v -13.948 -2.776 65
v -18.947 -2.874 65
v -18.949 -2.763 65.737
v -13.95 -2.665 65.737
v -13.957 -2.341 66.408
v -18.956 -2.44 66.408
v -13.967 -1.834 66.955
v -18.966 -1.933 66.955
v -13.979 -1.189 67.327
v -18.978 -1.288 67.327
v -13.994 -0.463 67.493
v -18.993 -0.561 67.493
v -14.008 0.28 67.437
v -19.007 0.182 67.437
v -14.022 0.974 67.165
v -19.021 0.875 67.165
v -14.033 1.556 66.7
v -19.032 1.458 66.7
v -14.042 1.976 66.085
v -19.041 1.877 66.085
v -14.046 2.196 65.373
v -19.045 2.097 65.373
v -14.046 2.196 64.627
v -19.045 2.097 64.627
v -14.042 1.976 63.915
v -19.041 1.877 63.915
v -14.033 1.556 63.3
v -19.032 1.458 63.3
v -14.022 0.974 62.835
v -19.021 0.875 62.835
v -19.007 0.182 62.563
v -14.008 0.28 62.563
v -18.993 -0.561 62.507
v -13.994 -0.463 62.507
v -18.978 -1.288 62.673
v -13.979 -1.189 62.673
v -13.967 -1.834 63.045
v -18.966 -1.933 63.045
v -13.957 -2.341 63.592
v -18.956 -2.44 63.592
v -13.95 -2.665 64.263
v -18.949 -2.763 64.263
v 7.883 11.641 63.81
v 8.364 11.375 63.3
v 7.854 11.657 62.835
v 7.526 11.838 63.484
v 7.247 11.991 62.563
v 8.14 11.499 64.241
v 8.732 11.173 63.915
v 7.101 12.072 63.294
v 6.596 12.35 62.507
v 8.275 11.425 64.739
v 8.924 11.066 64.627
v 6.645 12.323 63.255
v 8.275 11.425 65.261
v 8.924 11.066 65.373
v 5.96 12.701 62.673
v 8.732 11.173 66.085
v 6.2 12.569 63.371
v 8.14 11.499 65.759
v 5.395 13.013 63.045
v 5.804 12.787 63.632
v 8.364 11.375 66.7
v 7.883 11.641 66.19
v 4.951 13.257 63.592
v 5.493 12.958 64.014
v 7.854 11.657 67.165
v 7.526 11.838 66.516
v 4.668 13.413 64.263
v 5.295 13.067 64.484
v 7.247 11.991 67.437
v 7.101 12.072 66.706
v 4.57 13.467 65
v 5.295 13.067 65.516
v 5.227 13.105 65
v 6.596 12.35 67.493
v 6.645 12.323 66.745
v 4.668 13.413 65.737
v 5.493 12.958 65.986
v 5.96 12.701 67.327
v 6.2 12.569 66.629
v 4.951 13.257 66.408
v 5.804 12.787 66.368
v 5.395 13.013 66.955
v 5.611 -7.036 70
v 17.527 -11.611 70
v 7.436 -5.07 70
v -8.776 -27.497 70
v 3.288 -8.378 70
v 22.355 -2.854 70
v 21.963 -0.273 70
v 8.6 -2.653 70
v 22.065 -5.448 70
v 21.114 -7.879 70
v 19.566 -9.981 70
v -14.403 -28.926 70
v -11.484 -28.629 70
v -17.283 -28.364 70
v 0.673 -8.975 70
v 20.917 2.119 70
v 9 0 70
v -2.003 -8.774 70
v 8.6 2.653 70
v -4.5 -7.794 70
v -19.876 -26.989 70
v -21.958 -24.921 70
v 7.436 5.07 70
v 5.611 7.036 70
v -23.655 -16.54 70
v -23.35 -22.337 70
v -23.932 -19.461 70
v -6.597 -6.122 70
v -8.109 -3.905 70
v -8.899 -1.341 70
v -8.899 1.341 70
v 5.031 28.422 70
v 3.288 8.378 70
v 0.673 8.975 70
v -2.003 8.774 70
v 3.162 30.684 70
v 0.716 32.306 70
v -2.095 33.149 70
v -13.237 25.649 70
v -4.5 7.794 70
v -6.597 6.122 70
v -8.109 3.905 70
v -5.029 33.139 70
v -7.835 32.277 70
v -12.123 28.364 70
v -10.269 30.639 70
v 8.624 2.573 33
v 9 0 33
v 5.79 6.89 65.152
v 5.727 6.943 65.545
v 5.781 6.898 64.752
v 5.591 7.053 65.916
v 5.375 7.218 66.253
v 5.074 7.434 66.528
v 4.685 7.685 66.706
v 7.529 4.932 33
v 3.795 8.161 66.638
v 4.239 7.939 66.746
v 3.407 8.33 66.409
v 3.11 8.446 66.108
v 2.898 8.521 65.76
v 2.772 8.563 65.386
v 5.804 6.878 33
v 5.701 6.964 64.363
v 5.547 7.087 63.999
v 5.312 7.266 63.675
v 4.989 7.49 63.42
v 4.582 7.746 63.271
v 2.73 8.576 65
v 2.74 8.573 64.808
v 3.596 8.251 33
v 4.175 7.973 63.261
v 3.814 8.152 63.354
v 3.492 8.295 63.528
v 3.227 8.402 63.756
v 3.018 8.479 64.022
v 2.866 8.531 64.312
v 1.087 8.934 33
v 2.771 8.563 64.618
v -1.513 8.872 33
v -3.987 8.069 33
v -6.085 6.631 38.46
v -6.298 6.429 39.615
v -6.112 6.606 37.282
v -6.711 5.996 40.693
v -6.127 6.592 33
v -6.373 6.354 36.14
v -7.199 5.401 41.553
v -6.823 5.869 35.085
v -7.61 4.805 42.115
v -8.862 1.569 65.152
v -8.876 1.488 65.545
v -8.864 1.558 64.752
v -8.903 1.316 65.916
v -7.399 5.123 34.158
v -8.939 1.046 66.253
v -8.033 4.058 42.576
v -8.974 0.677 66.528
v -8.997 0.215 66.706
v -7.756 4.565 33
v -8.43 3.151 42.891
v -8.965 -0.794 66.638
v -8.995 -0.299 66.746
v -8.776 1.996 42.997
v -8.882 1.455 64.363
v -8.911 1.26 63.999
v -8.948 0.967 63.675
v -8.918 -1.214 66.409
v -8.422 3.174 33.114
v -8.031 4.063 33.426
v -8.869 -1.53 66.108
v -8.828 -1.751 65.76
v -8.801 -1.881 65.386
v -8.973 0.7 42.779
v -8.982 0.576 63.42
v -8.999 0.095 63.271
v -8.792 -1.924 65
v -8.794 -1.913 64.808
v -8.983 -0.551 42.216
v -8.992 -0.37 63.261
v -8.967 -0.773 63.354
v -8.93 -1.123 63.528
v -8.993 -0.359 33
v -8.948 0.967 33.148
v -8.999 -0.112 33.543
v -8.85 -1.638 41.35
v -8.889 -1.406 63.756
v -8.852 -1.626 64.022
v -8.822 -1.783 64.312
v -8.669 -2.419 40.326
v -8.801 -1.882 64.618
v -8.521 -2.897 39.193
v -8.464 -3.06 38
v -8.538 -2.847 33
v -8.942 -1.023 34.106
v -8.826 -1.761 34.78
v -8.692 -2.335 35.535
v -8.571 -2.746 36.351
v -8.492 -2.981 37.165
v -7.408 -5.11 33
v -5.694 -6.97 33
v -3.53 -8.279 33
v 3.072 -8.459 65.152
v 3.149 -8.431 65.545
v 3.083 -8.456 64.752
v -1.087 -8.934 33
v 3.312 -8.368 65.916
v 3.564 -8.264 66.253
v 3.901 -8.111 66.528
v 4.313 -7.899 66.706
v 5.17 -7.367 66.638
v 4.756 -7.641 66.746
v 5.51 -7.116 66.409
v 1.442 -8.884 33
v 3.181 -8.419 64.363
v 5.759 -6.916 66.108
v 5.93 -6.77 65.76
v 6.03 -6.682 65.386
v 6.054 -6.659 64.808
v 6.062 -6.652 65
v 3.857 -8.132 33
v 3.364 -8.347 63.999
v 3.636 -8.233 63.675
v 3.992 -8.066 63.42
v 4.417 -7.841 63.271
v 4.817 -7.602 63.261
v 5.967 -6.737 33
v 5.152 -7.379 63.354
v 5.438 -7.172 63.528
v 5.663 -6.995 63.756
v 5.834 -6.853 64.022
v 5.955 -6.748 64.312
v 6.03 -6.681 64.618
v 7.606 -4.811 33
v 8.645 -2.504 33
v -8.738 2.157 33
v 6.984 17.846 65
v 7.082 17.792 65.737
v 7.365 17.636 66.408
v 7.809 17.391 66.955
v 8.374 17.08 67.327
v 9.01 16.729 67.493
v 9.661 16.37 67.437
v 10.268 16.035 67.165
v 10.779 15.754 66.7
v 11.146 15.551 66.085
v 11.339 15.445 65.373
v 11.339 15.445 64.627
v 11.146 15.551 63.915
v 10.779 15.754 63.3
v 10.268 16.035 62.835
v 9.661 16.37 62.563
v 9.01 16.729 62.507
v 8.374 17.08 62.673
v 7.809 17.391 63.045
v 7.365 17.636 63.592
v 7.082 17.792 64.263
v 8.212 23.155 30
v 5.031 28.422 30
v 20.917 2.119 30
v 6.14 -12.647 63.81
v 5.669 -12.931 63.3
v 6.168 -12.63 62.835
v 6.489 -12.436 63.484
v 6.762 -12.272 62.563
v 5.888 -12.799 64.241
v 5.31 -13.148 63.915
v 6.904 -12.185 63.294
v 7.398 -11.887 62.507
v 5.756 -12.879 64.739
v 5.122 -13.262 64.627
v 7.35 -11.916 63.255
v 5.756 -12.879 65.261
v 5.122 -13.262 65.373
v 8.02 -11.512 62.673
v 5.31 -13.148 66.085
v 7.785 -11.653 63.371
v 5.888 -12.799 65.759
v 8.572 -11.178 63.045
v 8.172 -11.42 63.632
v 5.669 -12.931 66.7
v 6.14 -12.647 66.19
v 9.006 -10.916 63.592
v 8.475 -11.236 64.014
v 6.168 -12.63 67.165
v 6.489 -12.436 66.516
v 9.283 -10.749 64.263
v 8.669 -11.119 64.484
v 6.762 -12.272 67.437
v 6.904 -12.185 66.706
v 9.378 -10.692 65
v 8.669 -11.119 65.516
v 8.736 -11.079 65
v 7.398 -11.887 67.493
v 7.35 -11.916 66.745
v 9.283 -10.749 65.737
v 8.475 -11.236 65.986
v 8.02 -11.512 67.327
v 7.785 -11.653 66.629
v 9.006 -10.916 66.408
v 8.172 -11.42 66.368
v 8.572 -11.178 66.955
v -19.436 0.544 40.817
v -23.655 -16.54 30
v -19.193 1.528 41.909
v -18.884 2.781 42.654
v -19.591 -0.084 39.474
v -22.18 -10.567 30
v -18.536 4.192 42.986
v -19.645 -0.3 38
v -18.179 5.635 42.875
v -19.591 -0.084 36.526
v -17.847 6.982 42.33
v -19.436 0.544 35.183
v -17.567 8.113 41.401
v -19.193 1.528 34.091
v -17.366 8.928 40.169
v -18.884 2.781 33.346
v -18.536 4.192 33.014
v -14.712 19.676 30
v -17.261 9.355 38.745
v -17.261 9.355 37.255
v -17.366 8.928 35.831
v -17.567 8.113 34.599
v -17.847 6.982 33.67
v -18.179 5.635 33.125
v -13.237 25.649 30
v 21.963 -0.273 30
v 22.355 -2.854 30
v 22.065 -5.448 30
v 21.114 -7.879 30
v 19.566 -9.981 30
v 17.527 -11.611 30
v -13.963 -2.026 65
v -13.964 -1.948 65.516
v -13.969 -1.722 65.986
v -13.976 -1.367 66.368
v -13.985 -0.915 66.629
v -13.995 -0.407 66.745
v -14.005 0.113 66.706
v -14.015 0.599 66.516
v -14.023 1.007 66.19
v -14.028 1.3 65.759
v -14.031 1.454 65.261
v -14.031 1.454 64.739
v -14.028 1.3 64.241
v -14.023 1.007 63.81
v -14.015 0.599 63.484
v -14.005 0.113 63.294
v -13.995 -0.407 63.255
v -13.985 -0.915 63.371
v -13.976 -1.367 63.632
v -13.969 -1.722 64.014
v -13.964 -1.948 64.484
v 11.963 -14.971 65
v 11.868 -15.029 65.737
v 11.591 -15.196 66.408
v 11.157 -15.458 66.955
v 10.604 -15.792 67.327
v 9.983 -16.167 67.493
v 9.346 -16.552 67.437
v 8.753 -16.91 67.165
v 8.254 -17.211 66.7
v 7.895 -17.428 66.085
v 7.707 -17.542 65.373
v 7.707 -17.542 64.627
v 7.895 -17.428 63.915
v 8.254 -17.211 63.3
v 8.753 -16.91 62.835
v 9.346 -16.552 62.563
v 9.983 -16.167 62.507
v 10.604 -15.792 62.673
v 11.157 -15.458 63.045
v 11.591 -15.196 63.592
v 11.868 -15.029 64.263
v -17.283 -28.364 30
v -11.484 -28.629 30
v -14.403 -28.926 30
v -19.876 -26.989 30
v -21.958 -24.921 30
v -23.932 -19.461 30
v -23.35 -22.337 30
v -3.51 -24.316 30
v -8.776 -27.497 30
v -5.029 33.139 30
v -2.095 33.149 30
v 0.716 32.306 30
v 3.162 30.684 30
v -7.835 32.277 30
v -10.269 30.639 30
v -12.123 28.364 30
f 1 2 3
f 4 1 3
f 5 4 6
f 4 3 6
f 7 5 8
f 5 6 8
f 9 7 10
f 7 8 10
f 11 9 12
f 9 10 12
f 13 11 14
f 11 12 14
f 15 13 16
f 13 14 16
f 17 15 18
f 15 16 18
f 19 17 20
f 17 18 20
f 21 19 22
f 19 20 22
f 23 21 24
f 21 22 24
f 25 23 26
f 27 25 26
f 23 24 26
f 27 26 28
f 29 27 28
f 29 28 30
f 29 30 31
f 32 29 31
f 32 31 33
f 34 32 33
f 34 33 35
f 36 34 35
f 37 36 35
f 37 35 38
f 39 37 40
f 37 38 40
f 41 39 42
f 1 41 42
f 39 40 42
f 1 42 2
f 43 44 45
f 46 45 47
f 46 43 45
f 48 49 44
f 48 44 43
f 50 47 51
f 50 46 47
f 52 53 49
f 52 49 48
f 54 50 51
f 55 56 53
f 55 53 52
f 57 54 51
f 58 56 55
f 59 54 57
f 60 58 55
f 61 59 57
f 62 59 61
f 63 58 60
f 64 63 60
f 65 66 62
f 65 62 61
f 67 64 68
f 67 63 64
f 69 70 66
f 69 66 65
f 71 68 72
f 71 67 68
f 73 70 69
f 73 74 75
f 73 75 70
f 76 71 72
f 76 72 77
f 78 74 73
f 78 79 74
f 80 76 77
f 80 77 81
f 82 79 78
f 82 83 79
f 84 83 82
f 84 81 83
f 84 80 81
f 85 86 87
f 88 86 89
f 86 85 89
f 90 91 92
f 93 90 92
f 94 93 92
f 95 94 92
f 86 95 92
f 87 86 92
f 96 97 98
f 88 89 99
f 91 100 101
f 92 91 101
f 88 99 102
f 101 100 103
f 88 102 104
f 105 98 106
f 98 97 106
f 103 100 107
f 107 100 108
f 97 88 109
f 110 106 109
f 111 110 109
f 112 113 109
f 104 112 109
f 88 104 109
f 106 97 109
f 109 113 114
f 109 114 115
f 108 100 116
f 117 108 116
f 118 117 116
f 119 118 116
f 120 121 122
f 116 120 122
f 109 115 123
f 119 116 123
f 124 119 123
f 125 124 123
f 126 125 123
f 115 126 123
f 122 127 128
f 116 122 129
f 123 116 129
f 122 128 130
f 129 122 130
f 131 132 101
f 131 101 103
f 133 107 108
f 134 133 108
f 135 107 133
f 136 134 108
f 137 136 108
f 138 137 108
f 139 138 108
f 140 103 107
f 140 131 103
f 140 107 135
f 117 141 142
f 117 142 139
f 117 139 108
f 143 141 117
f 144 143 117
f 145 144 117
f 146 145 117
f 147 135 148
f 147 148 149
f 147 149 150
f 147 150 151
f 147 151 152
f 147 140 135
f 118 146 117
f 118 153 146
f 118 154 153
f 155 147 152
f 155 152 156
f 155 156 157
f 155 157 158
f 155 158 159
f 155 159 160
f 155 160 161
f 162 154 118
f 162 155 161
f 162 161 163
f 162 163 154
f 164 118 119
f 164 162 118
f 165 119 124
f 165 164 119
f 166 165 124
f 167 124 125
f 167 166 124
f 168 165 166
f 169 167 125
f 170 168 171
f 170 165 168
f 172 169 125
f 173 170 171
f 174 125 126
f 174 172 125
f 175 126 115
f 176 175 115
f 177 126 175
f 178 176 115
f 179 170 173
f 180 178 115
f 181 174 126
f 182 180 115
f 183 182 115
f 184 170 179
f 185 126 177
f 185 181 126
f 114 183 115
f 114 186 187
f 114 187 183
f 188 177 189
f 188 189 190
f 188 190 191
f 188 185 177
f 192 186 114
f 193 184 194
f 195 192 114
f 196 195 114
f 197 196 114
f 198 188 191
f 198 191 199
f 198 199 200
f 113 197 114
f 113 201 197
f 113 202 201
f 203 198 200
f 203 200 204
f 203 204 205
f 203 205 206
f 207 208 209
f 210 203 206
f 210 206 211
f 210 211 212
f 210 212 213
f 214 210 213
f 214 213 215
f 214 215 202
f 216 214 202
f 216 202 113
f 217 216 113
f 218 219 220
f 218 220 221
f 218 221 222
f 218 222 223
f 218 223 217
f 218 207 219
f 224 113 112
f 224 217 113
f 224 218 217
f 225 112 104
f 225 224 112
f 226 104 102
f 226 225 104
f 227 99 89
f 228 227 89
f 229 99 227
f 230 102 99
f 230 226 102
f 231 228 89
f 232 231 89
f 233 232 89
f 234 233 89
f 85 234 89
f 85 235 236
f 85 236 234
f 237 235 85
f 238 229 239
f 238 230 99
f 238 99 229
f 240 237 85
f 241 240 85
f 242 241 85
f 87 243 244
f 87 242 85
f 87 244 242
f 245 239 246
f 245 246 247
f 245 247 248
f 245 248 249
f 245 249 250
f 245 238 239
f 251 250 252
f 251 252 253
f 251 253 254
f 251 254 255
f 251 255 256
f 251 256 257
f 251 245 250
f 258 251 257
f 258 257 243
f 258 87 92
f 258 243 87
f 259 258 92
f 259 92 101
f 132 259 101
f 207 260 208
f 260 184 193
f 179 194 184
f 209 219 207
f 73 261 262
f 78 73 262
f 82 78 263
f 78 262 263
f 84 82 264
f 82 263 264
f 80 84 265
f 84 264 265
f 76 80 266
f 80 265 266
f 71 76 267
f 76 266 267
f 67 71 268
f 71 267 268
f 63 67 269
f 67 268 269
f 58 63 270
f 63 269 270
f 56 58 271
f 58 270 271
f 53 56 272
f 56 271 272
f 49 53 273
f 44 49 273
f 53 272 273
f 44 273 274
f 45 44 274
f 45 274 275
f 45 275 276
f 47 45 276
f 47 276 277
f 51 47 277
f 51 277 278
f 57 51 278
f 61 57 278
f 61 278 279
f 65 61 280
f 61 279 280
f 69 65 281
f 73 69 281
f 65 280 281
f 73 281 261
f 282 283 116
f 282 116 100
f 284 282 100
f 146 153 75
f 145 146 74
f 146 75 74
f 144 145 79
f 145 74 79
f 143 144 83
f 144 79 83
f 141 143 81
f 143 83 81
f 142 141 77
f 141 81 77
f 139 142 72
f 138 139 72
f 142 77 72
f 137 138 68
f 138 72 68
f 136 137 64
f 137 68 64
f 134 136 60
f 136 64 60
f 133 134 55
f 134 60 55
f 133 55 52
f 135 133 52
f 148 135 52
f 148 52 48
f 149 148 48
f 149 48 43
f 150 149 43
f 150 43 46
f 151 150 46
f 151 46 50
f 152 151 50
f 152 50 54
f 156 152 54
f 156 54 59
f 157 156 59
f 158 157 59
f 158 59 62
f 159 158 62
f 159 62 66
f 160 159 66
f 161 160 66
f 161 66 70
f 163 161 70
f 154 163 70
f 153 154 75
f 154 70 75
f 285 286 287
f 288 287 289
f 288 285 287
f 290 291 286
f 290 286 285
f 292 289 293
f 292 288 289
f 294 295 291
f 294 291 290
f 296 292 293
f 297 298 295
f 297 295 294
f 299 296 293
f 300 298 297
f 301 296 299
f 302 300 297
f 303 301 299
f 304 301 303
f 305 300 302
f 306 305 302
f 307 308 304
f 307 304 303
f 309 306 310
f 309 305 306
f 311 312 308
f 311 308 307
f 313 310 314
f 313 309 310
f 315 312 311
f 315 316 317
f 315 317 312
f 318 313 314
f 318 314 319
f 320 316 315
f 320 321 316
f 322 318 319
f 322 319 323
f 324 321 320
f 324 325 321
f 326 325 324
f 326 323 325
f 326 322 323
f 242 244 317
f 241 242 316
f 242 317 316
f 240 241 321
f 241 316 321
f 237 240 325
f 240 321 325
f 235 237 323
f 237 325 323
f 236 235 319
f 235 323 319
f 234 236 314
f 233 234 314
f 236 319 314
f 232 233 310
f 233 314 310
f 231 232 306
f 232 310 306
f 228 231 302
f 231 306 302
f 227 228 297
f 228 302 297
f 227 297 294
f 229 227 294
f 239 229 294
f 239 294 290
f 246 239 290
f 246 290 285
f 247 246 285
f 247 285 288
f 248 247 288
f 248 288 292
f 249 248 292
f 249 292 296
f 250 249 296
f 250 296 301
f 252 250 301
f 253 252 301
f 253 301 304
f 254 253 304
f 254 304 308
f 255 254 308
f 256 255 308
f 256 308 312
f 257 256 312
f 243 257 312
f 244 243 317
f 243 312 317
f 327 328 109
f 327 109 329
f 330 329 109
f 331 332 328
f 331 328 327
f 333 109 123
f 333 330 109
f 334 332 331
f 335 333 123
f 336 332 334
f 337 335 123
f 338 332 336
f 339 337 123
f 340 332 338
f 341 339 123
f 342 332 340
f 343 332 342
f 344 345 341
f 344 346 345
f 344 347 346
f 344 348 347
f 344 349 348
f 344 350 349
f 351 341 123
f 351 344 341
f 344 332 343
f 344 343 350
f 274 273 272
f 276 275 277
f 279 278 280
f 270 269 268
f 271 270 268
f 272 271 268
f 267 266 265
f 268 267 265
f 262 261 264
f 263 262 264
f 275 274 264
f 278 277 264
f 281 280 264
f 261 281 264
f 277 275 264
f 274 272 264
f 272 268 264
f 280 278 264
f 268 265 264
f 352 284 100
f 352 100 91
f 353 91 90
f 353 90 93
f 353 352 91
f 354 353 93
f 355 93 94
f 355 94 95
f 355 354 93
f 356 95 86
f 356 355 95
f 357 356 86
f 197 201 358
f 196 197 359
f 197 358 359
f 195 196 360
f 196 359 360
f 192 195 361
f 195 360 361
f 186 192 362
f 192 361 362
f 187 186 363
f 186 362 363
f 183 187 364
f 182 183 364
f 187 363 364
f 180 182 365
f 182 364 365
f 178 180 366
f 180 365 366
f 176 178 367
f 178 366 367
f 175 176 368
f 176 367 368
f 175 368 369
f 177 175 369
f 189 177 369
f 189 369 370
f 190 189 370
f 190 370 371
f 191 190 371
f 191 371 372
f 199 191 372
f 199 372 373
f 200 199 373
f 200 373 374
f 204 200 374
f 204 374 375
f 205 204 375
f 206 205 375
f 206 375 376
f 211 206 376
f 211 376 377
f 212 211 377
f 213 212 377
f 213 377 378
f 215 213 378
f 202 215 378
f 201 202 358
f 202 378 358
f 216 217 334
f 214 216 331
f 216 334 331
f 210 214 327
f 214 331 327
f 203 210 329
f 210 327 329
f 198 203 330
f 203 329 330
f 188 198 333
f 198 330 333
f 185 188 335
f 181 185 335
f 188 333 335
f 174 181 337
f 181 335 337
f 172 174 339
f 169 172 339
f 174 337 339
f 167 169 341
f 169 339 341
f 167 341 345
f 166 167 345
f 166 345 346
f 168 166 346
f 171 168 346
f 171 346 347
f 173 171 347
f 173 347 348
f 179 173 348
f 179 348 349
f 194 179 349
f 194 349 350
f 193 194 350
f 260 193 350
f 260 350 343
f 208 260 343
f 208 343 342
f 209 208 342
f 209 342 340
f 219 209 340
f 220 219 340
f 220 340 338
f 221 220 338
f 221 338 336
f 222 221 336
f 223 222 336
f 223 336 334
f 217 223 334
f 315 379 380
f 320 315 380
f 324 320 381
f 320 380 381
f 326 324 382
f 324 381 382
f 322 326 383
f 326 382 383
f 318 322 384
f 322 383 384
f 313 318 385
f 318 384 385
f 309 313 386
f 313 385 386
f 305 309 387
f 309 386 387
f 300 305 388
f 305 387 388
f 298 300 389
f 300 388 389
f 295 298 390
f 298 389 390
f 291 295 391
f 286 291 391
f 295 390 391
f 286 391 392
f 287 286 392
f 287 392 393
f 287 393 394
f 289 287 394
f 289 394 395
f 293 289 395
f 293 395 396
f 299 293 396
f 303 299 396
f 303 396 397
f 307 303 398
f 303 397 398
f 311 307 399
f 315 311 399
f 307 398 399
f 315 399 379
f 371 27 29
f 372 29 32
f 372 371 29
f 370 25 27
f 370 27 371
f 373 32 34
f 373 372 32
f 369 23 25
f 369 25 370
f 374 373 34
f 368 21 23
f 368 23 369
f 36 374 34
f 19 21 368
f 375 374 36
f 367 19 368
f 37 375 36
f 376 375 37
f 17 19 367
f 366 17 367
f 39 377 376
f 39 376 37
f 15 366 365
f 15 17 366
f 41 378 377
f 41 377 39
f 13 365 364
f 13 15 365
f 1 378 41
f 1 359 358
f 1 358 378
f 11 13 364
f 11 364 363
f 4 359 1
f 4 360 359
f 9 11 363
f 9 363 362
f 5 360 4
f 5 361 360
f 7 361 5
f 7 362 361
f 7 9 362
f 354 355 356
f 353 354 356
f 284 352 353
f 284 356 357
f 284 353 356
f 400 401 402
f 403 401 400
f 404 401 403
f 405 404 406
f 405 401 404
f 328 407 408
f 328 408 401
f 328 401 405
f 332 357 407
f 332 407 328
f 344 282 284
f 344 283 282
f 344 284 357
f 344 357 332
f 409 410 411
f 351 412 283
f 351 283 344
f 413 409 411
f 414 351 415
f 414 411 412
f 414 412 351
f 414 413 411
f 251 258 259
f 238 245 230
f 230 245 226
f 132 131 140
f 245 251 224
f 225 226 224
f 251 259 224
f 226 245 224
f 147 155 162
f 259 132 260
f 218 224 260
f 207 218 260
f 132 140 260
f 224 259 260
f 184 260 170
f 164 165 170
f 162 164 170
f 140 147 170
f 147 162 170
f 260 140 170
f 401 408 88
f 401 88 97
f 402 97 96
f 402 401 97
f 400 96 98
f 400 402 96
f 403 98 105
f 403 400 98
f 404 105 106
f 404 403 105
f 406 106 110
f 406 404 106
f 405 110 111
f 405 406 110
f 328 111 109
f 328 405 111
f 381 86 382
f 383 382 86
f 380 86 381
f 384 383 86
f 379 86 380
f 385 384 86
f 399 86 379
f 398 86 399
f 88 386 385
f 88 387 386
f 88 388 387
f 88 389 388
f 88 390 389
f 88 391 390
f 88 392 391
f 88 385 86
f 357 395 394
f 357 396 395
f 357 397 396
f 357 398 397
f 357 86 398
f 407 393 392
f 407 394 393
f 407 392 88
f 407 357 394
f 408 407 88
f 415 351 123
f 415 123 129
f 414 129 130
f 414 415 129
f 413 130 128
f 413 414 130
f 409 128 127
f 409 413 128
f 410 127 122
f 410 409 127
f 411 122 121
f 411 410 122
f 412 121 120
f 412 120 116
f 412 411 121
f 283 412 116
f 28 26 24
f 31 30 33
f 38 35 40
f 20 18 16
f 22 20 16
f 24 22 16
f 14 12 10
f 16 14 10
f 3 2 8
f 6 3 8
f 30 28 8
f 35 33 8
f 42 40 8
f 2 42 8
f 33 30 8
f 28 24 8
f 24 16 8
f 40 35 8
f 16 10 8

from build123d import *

# Parameters (mm, degrees)
SKETCH1_R               = 9
BOSS_EXTRUDE1_DEPTH     = 70
SKETCH2_R               = 2.5
CUT_EXTRUDE1_DEPTH      = 5
CUT_EXTRUDE2_REACH      = 90.987
CUT_EXTRUDE2_END_RADIUS = 9
SKETCH3_R               = 1.75
CIRPATTERN1_COUNT       = 3
SKETCH5_W               = 24.568161226
SKETCH5_H               = 25
SKETCH6_R               = 9
BOSS_EXTRUDE2_DEPTH     = 5
SKETCH8_R               = 9
BOSS_EXTRUDE3_DEPTH     = 3
CUT_EXTRUDE3_REACH      = 83.112
SKETCH9_R               = 1.875
SKETCH11_R              = 4
CUT_EXTRUDE4_DEPTH      = 3
CUT_EXTRUDE5_DEPTH      = 82.111701173
CUT_EXTRUDE5_DEPTH_BACK = 82.111701173
SKETCH12_W              = 65.170629785
SKETCH12_H              = 33.219663289
CUT_EXTRUDE6_REACH      = 89.673
CUT_EXTRUDE6_END_RADIUS = 9
SKETCH13_R              = 5


with BuildPart() as part:
    # Sketch1 → Boss-Extrude1 (new body)
    with BuildSketch(Plane.XY):
        with BuildLine():
            Line((-23.6546385, -16.539669722), (-13.23734813, 25.649078182))
            ThreePointArc((-13.23734813, 25.649078182), (-5.029445343, 33.138647287), (5.031042671, 28.421667909))
            Line((5.031042671, 28.421667909), (20.916771438, 2.118648772))
            ThreePointArc((20.916771438, 2.118648772), (22.065215706, -5.448366461), (17.526600651, -11.611126974))
            Line((17.526600651, -11.611126974), (-8.776418486, -27.496855741))
            ThreePointArc((-8.776418486, -27.496855741), (-19.876207308, -26.988917124), (-23.6546385, -16.539669722))
        make_face()
        Circle(SKETCH1_R, mode=Mode.SUBTRACT)
    extrude(amount=BOSS_EXTRUDE1_DEPTH)

    # Sketch2 → Cut-Extrude1 (cut)
    with BuildSketch(Plane(origin=(9.822624711, -16.263949206, 0), x_dir=(0.8559973266359324, 0.5169802479709809, 0), z_dir=(0.5169802479709809, -0.8559973266359324, 0))):
        with Locations((0, 65)):
            Circle(SKETCH2_R)
    cut_extrude1 = extrude(amount=-CUT_EXTRUDE1_DEPTH, mode=Mode.SUBTRACT)

    # Cut-Extrude2: up to this cylinder (the profile starts outside it)
    cut_extrude2_end = Plane(origin=(0, 0, 65), z_dir=(0, 0, -1)) * Cylinder(CUT_EXTRUDE2_END_RADIUS, 200.974, mode=Mode.PRIVATE)
    # Sketch3 → Cut-Extrude2 (cut, up to the surface)
    with BuildSketch(Plane(origin=(7.237723472, -11.983962573, 0), x_dir=(0.8559973266359324, 0.5169802479709809, 0), z_dir=(0.5169802479709809, -0.8559973266359324, 0)), mode=Mode.PRIVATE) as cut_extrude2_sk1:
        with Locations((0, 65)):
            Circle(SKETCH3_R)
    cut_extrude2_tool1 = extrude(cut_extrude2_sk1.sketch, amount=-CUT_EXTRUDE2_REACH, mode=Mode.PRIVATE) - cut_extrude2_end
    cut_extrude2 = cut_extrude2_tool1.solids().sort_by_distance((7.237723, -11.983963, 65))[0]
    add(cut_extrude2, mode=Mode.SUBTRACT)

    # CirPattern1: Cut-Extrude1, Cut-Extrude2 ×3 about axis
    cirpattern1_axis = Axis((0, 0, 0), (0, 0, 1))
    add([cut_extrude1.rotate(cirpattern1_axis, i * 360 / CIRPATTERN1_COUNT) for i in range(1, CIRPATTERN1_COUNT)], mode=Mode.SUBTRACT)
    add([cut_extrude2.rotate(cirpattern1_axis, i * 360 / CIRPATTERN1_COUNT) for i in range(1, CIRPATTERN1_COUNT)], mode=Mode.SUBTRACT)

    # Sketch5 → Cut-Revolve1 (revolve, cut)
    with BuildSketch(Plane(origin=(0, 0, 0), x_dir=(1, 0, 0), z_dir=(0, 1, 0)), mode=Mode.PRIVATE) as cut_revolve1_sk:
        with Locations((-12.284080613, -17.5)):
            Rectangle(SKETCH5_W, SKETCH5_H)
    revolve(cut_revolve1_sk.sketch.rotate(Axis((0, 0, 0), (0, 0, 1)), 180), axis=Axis((0, 0, 0), (0, 0, 1)), mode=Mode.SUBTRACT)

    # Sketch6 → Boss-Extrude2 (add)
    with BuildSketch(Plane(origin=(0, 0, 0), x_dir=(-1, 0, 0), z_dir=(0, 0, -1))):
        with Locations(Location((0, 0, 0), (0, 0, 180))):
            Circle(SKETCH6_R)
    extrude(amount=-BOSS_EXTRUDE2_DEPTH)

    # Sketch8 → Boss-Extrude3 (add)
    with BuildSketch(Plane(origin=(0, 0, 30), x_dir=(-1, 0, 0), z_dir=(0, 0, -1))):
        Circle(SKETCH8_R)
    extrude(amount=-BOSS_EXTRUDE3_DEPTH)

    # Sketch9 → Cut-Extrude3 (cut, up to next)
    with BuildSketch(Plane(origin=(0, 0, 0), x_dir=(-1, 0, 0), z_dir=(0, 0, -1)), mode=Mode.PRIVATE) as cut_extrude3_sk1:
        with Locations((0, 8)):
            Circle(SKETCH9_R)
    cut_extrude3_tool1 = extrude(cut_extrude3_sk1.sketch, amount=-CUT_EXTRUDE3_REACH, mode=Mode.PRIVATE) & part.part
    # Sketch9 → Cut-Extrude3 (cut, up to next)
    with BuildSketch(Plane(origin=(0, 0, 0), x_dir=(-1, 0, 0), z_dir=(0, 0, -1)), mode=Mode.PRIVATE) as cut_extrude3_sk2:
        with Locations((8, 0)):
            Circle(SKETCH9_R)
    cut_extrude3_tool2 = extrude(cut_extrude3_sk2.sketch, amount=-CUT_EXTRUDE3_REACH, mode=Mode.PRIVATE) & part.part
    # Sketch9 → Cut-Extrude3 (cut, up to next)
    with BuildSketch(Plane(origin=(0, 0, 0), x_dir=(-1, 0, 0), z_dir=(0, 0, -1)), mode=Mode.PRIVATE) as cut_extrude3_sk3:
        with Locations((0, -8)):
            Circle(SKETCH9_R)
    cut_extrude3_tool3 = extrude(cut_extrude3_sk3.sketch, amount=-CUT_EXTRUDE3_REACH, mode=Mode.PRIVATE) & part.part
    # Sketch9 → Cut-Extrude3 (cut, up to next)
    with BuildSketch(Plane(origin=(0, 0, 0), x_dir=(-1, 0, 0), z_dir=(0, 0, -1)), mode=Mode.PRIVATE) as cut_extrude3_sk4:
        with Locations((-8, 0)):
            Circle(SKETCH9_R)
    cut_extrude3_tool4 = extrude(cut_extrude3_sk4.sketch, amount=-CUT_EXTRUDE3_REACH, mode=Mode.PRIVATE) & part.part
    add(cut_extrude3_tool1.solids().sort_by_distance((0, 8, 0))[0], mode=Mode.SUBTRACT)
    add(cut_extrude3_tool2.solids().sort_by_distance((-8, 0, 0))[0], mode=Mode.SUBTRACT)
    add(cut_extrude3_tool3.solids().sort_by_distance((0, -8, 0))[0], mode=Mode.SUBTRACT)
    add(cut_extrude3_tool4.solids().sort_by_distance((8, 0, 0))[0], mode=Mode.SUBTRACT)

    # Sketch11 → Cut-Extrude4 (cut)
    with BuildSketch(Plane(origin=(0, 0, 0), x_dir=(-1, 0, 0), z_dir=(0, 0, -1))):
        Circle(SKETCH11_R)
    extrude(amount=-CUT_EXTRUDE4_DEPTH, mode=Mode.SUBTRACT)

    # Sketch12 → Cut-Extrude5 (cut, two sides: drawn at the far end of the back side and taken through both)
    with BuildSketch(Plane(origin=(0, 0, 0), x_dir=(1, 0, 0), z_dir=(0, 1, 0)).offset(-CUT_EXTRUDE5_DEPTH_BACK)):
        with Locations((1.843004816, -13.390168356)):
            Rectangle(SKETCH12_W, SKETCH12_H)
    extrude(amount=CUT_EXTRUDE5_DEPTH + CUT_EXTRUDE5_DEPTH_BACK, mode=Mode.SUBTRACT)

    # Cut-Extrude6: up to this cylinder (the profile starts outside it)
    cut_extrude6_end = Plane(origin=(0, 0, 38), z_dir=(0, 0, -1)) * Cylinder(CUT_EXTRUDE6_END_RADIUS, 198.346, mode=Mode.PRIVATE)
    # Sketch13 → Cut-Extrude6 (cut, up to the surface)
    with BuildSketch(Plane(origin=(-18.445993315, 4.55470423, 0), x_dir=(0, 0, 1), z_dir=(-0.9708417534216062, 0.23972127526204579, 0)), mode=Mode.PRIVATE) as cut_extrude6_sk1:
        with Locations(Location((38, 0, 0), (0, 0, 270))):
            Circle(SKETCH13_R)
    cut_extrude6_tool1 = extrude(cut_extrude6_sk1.sketch, amount=-CUT_EXTRUDE6_REACH, mode=Mode.PRIVATE) - cut_extrude6_end
    add(cut_extrude6_tool1.solids().sort_by_distance((-18.445993, 4.554704, 38))[0], mode=Mode.SUBTRACT)


solid = part.part
